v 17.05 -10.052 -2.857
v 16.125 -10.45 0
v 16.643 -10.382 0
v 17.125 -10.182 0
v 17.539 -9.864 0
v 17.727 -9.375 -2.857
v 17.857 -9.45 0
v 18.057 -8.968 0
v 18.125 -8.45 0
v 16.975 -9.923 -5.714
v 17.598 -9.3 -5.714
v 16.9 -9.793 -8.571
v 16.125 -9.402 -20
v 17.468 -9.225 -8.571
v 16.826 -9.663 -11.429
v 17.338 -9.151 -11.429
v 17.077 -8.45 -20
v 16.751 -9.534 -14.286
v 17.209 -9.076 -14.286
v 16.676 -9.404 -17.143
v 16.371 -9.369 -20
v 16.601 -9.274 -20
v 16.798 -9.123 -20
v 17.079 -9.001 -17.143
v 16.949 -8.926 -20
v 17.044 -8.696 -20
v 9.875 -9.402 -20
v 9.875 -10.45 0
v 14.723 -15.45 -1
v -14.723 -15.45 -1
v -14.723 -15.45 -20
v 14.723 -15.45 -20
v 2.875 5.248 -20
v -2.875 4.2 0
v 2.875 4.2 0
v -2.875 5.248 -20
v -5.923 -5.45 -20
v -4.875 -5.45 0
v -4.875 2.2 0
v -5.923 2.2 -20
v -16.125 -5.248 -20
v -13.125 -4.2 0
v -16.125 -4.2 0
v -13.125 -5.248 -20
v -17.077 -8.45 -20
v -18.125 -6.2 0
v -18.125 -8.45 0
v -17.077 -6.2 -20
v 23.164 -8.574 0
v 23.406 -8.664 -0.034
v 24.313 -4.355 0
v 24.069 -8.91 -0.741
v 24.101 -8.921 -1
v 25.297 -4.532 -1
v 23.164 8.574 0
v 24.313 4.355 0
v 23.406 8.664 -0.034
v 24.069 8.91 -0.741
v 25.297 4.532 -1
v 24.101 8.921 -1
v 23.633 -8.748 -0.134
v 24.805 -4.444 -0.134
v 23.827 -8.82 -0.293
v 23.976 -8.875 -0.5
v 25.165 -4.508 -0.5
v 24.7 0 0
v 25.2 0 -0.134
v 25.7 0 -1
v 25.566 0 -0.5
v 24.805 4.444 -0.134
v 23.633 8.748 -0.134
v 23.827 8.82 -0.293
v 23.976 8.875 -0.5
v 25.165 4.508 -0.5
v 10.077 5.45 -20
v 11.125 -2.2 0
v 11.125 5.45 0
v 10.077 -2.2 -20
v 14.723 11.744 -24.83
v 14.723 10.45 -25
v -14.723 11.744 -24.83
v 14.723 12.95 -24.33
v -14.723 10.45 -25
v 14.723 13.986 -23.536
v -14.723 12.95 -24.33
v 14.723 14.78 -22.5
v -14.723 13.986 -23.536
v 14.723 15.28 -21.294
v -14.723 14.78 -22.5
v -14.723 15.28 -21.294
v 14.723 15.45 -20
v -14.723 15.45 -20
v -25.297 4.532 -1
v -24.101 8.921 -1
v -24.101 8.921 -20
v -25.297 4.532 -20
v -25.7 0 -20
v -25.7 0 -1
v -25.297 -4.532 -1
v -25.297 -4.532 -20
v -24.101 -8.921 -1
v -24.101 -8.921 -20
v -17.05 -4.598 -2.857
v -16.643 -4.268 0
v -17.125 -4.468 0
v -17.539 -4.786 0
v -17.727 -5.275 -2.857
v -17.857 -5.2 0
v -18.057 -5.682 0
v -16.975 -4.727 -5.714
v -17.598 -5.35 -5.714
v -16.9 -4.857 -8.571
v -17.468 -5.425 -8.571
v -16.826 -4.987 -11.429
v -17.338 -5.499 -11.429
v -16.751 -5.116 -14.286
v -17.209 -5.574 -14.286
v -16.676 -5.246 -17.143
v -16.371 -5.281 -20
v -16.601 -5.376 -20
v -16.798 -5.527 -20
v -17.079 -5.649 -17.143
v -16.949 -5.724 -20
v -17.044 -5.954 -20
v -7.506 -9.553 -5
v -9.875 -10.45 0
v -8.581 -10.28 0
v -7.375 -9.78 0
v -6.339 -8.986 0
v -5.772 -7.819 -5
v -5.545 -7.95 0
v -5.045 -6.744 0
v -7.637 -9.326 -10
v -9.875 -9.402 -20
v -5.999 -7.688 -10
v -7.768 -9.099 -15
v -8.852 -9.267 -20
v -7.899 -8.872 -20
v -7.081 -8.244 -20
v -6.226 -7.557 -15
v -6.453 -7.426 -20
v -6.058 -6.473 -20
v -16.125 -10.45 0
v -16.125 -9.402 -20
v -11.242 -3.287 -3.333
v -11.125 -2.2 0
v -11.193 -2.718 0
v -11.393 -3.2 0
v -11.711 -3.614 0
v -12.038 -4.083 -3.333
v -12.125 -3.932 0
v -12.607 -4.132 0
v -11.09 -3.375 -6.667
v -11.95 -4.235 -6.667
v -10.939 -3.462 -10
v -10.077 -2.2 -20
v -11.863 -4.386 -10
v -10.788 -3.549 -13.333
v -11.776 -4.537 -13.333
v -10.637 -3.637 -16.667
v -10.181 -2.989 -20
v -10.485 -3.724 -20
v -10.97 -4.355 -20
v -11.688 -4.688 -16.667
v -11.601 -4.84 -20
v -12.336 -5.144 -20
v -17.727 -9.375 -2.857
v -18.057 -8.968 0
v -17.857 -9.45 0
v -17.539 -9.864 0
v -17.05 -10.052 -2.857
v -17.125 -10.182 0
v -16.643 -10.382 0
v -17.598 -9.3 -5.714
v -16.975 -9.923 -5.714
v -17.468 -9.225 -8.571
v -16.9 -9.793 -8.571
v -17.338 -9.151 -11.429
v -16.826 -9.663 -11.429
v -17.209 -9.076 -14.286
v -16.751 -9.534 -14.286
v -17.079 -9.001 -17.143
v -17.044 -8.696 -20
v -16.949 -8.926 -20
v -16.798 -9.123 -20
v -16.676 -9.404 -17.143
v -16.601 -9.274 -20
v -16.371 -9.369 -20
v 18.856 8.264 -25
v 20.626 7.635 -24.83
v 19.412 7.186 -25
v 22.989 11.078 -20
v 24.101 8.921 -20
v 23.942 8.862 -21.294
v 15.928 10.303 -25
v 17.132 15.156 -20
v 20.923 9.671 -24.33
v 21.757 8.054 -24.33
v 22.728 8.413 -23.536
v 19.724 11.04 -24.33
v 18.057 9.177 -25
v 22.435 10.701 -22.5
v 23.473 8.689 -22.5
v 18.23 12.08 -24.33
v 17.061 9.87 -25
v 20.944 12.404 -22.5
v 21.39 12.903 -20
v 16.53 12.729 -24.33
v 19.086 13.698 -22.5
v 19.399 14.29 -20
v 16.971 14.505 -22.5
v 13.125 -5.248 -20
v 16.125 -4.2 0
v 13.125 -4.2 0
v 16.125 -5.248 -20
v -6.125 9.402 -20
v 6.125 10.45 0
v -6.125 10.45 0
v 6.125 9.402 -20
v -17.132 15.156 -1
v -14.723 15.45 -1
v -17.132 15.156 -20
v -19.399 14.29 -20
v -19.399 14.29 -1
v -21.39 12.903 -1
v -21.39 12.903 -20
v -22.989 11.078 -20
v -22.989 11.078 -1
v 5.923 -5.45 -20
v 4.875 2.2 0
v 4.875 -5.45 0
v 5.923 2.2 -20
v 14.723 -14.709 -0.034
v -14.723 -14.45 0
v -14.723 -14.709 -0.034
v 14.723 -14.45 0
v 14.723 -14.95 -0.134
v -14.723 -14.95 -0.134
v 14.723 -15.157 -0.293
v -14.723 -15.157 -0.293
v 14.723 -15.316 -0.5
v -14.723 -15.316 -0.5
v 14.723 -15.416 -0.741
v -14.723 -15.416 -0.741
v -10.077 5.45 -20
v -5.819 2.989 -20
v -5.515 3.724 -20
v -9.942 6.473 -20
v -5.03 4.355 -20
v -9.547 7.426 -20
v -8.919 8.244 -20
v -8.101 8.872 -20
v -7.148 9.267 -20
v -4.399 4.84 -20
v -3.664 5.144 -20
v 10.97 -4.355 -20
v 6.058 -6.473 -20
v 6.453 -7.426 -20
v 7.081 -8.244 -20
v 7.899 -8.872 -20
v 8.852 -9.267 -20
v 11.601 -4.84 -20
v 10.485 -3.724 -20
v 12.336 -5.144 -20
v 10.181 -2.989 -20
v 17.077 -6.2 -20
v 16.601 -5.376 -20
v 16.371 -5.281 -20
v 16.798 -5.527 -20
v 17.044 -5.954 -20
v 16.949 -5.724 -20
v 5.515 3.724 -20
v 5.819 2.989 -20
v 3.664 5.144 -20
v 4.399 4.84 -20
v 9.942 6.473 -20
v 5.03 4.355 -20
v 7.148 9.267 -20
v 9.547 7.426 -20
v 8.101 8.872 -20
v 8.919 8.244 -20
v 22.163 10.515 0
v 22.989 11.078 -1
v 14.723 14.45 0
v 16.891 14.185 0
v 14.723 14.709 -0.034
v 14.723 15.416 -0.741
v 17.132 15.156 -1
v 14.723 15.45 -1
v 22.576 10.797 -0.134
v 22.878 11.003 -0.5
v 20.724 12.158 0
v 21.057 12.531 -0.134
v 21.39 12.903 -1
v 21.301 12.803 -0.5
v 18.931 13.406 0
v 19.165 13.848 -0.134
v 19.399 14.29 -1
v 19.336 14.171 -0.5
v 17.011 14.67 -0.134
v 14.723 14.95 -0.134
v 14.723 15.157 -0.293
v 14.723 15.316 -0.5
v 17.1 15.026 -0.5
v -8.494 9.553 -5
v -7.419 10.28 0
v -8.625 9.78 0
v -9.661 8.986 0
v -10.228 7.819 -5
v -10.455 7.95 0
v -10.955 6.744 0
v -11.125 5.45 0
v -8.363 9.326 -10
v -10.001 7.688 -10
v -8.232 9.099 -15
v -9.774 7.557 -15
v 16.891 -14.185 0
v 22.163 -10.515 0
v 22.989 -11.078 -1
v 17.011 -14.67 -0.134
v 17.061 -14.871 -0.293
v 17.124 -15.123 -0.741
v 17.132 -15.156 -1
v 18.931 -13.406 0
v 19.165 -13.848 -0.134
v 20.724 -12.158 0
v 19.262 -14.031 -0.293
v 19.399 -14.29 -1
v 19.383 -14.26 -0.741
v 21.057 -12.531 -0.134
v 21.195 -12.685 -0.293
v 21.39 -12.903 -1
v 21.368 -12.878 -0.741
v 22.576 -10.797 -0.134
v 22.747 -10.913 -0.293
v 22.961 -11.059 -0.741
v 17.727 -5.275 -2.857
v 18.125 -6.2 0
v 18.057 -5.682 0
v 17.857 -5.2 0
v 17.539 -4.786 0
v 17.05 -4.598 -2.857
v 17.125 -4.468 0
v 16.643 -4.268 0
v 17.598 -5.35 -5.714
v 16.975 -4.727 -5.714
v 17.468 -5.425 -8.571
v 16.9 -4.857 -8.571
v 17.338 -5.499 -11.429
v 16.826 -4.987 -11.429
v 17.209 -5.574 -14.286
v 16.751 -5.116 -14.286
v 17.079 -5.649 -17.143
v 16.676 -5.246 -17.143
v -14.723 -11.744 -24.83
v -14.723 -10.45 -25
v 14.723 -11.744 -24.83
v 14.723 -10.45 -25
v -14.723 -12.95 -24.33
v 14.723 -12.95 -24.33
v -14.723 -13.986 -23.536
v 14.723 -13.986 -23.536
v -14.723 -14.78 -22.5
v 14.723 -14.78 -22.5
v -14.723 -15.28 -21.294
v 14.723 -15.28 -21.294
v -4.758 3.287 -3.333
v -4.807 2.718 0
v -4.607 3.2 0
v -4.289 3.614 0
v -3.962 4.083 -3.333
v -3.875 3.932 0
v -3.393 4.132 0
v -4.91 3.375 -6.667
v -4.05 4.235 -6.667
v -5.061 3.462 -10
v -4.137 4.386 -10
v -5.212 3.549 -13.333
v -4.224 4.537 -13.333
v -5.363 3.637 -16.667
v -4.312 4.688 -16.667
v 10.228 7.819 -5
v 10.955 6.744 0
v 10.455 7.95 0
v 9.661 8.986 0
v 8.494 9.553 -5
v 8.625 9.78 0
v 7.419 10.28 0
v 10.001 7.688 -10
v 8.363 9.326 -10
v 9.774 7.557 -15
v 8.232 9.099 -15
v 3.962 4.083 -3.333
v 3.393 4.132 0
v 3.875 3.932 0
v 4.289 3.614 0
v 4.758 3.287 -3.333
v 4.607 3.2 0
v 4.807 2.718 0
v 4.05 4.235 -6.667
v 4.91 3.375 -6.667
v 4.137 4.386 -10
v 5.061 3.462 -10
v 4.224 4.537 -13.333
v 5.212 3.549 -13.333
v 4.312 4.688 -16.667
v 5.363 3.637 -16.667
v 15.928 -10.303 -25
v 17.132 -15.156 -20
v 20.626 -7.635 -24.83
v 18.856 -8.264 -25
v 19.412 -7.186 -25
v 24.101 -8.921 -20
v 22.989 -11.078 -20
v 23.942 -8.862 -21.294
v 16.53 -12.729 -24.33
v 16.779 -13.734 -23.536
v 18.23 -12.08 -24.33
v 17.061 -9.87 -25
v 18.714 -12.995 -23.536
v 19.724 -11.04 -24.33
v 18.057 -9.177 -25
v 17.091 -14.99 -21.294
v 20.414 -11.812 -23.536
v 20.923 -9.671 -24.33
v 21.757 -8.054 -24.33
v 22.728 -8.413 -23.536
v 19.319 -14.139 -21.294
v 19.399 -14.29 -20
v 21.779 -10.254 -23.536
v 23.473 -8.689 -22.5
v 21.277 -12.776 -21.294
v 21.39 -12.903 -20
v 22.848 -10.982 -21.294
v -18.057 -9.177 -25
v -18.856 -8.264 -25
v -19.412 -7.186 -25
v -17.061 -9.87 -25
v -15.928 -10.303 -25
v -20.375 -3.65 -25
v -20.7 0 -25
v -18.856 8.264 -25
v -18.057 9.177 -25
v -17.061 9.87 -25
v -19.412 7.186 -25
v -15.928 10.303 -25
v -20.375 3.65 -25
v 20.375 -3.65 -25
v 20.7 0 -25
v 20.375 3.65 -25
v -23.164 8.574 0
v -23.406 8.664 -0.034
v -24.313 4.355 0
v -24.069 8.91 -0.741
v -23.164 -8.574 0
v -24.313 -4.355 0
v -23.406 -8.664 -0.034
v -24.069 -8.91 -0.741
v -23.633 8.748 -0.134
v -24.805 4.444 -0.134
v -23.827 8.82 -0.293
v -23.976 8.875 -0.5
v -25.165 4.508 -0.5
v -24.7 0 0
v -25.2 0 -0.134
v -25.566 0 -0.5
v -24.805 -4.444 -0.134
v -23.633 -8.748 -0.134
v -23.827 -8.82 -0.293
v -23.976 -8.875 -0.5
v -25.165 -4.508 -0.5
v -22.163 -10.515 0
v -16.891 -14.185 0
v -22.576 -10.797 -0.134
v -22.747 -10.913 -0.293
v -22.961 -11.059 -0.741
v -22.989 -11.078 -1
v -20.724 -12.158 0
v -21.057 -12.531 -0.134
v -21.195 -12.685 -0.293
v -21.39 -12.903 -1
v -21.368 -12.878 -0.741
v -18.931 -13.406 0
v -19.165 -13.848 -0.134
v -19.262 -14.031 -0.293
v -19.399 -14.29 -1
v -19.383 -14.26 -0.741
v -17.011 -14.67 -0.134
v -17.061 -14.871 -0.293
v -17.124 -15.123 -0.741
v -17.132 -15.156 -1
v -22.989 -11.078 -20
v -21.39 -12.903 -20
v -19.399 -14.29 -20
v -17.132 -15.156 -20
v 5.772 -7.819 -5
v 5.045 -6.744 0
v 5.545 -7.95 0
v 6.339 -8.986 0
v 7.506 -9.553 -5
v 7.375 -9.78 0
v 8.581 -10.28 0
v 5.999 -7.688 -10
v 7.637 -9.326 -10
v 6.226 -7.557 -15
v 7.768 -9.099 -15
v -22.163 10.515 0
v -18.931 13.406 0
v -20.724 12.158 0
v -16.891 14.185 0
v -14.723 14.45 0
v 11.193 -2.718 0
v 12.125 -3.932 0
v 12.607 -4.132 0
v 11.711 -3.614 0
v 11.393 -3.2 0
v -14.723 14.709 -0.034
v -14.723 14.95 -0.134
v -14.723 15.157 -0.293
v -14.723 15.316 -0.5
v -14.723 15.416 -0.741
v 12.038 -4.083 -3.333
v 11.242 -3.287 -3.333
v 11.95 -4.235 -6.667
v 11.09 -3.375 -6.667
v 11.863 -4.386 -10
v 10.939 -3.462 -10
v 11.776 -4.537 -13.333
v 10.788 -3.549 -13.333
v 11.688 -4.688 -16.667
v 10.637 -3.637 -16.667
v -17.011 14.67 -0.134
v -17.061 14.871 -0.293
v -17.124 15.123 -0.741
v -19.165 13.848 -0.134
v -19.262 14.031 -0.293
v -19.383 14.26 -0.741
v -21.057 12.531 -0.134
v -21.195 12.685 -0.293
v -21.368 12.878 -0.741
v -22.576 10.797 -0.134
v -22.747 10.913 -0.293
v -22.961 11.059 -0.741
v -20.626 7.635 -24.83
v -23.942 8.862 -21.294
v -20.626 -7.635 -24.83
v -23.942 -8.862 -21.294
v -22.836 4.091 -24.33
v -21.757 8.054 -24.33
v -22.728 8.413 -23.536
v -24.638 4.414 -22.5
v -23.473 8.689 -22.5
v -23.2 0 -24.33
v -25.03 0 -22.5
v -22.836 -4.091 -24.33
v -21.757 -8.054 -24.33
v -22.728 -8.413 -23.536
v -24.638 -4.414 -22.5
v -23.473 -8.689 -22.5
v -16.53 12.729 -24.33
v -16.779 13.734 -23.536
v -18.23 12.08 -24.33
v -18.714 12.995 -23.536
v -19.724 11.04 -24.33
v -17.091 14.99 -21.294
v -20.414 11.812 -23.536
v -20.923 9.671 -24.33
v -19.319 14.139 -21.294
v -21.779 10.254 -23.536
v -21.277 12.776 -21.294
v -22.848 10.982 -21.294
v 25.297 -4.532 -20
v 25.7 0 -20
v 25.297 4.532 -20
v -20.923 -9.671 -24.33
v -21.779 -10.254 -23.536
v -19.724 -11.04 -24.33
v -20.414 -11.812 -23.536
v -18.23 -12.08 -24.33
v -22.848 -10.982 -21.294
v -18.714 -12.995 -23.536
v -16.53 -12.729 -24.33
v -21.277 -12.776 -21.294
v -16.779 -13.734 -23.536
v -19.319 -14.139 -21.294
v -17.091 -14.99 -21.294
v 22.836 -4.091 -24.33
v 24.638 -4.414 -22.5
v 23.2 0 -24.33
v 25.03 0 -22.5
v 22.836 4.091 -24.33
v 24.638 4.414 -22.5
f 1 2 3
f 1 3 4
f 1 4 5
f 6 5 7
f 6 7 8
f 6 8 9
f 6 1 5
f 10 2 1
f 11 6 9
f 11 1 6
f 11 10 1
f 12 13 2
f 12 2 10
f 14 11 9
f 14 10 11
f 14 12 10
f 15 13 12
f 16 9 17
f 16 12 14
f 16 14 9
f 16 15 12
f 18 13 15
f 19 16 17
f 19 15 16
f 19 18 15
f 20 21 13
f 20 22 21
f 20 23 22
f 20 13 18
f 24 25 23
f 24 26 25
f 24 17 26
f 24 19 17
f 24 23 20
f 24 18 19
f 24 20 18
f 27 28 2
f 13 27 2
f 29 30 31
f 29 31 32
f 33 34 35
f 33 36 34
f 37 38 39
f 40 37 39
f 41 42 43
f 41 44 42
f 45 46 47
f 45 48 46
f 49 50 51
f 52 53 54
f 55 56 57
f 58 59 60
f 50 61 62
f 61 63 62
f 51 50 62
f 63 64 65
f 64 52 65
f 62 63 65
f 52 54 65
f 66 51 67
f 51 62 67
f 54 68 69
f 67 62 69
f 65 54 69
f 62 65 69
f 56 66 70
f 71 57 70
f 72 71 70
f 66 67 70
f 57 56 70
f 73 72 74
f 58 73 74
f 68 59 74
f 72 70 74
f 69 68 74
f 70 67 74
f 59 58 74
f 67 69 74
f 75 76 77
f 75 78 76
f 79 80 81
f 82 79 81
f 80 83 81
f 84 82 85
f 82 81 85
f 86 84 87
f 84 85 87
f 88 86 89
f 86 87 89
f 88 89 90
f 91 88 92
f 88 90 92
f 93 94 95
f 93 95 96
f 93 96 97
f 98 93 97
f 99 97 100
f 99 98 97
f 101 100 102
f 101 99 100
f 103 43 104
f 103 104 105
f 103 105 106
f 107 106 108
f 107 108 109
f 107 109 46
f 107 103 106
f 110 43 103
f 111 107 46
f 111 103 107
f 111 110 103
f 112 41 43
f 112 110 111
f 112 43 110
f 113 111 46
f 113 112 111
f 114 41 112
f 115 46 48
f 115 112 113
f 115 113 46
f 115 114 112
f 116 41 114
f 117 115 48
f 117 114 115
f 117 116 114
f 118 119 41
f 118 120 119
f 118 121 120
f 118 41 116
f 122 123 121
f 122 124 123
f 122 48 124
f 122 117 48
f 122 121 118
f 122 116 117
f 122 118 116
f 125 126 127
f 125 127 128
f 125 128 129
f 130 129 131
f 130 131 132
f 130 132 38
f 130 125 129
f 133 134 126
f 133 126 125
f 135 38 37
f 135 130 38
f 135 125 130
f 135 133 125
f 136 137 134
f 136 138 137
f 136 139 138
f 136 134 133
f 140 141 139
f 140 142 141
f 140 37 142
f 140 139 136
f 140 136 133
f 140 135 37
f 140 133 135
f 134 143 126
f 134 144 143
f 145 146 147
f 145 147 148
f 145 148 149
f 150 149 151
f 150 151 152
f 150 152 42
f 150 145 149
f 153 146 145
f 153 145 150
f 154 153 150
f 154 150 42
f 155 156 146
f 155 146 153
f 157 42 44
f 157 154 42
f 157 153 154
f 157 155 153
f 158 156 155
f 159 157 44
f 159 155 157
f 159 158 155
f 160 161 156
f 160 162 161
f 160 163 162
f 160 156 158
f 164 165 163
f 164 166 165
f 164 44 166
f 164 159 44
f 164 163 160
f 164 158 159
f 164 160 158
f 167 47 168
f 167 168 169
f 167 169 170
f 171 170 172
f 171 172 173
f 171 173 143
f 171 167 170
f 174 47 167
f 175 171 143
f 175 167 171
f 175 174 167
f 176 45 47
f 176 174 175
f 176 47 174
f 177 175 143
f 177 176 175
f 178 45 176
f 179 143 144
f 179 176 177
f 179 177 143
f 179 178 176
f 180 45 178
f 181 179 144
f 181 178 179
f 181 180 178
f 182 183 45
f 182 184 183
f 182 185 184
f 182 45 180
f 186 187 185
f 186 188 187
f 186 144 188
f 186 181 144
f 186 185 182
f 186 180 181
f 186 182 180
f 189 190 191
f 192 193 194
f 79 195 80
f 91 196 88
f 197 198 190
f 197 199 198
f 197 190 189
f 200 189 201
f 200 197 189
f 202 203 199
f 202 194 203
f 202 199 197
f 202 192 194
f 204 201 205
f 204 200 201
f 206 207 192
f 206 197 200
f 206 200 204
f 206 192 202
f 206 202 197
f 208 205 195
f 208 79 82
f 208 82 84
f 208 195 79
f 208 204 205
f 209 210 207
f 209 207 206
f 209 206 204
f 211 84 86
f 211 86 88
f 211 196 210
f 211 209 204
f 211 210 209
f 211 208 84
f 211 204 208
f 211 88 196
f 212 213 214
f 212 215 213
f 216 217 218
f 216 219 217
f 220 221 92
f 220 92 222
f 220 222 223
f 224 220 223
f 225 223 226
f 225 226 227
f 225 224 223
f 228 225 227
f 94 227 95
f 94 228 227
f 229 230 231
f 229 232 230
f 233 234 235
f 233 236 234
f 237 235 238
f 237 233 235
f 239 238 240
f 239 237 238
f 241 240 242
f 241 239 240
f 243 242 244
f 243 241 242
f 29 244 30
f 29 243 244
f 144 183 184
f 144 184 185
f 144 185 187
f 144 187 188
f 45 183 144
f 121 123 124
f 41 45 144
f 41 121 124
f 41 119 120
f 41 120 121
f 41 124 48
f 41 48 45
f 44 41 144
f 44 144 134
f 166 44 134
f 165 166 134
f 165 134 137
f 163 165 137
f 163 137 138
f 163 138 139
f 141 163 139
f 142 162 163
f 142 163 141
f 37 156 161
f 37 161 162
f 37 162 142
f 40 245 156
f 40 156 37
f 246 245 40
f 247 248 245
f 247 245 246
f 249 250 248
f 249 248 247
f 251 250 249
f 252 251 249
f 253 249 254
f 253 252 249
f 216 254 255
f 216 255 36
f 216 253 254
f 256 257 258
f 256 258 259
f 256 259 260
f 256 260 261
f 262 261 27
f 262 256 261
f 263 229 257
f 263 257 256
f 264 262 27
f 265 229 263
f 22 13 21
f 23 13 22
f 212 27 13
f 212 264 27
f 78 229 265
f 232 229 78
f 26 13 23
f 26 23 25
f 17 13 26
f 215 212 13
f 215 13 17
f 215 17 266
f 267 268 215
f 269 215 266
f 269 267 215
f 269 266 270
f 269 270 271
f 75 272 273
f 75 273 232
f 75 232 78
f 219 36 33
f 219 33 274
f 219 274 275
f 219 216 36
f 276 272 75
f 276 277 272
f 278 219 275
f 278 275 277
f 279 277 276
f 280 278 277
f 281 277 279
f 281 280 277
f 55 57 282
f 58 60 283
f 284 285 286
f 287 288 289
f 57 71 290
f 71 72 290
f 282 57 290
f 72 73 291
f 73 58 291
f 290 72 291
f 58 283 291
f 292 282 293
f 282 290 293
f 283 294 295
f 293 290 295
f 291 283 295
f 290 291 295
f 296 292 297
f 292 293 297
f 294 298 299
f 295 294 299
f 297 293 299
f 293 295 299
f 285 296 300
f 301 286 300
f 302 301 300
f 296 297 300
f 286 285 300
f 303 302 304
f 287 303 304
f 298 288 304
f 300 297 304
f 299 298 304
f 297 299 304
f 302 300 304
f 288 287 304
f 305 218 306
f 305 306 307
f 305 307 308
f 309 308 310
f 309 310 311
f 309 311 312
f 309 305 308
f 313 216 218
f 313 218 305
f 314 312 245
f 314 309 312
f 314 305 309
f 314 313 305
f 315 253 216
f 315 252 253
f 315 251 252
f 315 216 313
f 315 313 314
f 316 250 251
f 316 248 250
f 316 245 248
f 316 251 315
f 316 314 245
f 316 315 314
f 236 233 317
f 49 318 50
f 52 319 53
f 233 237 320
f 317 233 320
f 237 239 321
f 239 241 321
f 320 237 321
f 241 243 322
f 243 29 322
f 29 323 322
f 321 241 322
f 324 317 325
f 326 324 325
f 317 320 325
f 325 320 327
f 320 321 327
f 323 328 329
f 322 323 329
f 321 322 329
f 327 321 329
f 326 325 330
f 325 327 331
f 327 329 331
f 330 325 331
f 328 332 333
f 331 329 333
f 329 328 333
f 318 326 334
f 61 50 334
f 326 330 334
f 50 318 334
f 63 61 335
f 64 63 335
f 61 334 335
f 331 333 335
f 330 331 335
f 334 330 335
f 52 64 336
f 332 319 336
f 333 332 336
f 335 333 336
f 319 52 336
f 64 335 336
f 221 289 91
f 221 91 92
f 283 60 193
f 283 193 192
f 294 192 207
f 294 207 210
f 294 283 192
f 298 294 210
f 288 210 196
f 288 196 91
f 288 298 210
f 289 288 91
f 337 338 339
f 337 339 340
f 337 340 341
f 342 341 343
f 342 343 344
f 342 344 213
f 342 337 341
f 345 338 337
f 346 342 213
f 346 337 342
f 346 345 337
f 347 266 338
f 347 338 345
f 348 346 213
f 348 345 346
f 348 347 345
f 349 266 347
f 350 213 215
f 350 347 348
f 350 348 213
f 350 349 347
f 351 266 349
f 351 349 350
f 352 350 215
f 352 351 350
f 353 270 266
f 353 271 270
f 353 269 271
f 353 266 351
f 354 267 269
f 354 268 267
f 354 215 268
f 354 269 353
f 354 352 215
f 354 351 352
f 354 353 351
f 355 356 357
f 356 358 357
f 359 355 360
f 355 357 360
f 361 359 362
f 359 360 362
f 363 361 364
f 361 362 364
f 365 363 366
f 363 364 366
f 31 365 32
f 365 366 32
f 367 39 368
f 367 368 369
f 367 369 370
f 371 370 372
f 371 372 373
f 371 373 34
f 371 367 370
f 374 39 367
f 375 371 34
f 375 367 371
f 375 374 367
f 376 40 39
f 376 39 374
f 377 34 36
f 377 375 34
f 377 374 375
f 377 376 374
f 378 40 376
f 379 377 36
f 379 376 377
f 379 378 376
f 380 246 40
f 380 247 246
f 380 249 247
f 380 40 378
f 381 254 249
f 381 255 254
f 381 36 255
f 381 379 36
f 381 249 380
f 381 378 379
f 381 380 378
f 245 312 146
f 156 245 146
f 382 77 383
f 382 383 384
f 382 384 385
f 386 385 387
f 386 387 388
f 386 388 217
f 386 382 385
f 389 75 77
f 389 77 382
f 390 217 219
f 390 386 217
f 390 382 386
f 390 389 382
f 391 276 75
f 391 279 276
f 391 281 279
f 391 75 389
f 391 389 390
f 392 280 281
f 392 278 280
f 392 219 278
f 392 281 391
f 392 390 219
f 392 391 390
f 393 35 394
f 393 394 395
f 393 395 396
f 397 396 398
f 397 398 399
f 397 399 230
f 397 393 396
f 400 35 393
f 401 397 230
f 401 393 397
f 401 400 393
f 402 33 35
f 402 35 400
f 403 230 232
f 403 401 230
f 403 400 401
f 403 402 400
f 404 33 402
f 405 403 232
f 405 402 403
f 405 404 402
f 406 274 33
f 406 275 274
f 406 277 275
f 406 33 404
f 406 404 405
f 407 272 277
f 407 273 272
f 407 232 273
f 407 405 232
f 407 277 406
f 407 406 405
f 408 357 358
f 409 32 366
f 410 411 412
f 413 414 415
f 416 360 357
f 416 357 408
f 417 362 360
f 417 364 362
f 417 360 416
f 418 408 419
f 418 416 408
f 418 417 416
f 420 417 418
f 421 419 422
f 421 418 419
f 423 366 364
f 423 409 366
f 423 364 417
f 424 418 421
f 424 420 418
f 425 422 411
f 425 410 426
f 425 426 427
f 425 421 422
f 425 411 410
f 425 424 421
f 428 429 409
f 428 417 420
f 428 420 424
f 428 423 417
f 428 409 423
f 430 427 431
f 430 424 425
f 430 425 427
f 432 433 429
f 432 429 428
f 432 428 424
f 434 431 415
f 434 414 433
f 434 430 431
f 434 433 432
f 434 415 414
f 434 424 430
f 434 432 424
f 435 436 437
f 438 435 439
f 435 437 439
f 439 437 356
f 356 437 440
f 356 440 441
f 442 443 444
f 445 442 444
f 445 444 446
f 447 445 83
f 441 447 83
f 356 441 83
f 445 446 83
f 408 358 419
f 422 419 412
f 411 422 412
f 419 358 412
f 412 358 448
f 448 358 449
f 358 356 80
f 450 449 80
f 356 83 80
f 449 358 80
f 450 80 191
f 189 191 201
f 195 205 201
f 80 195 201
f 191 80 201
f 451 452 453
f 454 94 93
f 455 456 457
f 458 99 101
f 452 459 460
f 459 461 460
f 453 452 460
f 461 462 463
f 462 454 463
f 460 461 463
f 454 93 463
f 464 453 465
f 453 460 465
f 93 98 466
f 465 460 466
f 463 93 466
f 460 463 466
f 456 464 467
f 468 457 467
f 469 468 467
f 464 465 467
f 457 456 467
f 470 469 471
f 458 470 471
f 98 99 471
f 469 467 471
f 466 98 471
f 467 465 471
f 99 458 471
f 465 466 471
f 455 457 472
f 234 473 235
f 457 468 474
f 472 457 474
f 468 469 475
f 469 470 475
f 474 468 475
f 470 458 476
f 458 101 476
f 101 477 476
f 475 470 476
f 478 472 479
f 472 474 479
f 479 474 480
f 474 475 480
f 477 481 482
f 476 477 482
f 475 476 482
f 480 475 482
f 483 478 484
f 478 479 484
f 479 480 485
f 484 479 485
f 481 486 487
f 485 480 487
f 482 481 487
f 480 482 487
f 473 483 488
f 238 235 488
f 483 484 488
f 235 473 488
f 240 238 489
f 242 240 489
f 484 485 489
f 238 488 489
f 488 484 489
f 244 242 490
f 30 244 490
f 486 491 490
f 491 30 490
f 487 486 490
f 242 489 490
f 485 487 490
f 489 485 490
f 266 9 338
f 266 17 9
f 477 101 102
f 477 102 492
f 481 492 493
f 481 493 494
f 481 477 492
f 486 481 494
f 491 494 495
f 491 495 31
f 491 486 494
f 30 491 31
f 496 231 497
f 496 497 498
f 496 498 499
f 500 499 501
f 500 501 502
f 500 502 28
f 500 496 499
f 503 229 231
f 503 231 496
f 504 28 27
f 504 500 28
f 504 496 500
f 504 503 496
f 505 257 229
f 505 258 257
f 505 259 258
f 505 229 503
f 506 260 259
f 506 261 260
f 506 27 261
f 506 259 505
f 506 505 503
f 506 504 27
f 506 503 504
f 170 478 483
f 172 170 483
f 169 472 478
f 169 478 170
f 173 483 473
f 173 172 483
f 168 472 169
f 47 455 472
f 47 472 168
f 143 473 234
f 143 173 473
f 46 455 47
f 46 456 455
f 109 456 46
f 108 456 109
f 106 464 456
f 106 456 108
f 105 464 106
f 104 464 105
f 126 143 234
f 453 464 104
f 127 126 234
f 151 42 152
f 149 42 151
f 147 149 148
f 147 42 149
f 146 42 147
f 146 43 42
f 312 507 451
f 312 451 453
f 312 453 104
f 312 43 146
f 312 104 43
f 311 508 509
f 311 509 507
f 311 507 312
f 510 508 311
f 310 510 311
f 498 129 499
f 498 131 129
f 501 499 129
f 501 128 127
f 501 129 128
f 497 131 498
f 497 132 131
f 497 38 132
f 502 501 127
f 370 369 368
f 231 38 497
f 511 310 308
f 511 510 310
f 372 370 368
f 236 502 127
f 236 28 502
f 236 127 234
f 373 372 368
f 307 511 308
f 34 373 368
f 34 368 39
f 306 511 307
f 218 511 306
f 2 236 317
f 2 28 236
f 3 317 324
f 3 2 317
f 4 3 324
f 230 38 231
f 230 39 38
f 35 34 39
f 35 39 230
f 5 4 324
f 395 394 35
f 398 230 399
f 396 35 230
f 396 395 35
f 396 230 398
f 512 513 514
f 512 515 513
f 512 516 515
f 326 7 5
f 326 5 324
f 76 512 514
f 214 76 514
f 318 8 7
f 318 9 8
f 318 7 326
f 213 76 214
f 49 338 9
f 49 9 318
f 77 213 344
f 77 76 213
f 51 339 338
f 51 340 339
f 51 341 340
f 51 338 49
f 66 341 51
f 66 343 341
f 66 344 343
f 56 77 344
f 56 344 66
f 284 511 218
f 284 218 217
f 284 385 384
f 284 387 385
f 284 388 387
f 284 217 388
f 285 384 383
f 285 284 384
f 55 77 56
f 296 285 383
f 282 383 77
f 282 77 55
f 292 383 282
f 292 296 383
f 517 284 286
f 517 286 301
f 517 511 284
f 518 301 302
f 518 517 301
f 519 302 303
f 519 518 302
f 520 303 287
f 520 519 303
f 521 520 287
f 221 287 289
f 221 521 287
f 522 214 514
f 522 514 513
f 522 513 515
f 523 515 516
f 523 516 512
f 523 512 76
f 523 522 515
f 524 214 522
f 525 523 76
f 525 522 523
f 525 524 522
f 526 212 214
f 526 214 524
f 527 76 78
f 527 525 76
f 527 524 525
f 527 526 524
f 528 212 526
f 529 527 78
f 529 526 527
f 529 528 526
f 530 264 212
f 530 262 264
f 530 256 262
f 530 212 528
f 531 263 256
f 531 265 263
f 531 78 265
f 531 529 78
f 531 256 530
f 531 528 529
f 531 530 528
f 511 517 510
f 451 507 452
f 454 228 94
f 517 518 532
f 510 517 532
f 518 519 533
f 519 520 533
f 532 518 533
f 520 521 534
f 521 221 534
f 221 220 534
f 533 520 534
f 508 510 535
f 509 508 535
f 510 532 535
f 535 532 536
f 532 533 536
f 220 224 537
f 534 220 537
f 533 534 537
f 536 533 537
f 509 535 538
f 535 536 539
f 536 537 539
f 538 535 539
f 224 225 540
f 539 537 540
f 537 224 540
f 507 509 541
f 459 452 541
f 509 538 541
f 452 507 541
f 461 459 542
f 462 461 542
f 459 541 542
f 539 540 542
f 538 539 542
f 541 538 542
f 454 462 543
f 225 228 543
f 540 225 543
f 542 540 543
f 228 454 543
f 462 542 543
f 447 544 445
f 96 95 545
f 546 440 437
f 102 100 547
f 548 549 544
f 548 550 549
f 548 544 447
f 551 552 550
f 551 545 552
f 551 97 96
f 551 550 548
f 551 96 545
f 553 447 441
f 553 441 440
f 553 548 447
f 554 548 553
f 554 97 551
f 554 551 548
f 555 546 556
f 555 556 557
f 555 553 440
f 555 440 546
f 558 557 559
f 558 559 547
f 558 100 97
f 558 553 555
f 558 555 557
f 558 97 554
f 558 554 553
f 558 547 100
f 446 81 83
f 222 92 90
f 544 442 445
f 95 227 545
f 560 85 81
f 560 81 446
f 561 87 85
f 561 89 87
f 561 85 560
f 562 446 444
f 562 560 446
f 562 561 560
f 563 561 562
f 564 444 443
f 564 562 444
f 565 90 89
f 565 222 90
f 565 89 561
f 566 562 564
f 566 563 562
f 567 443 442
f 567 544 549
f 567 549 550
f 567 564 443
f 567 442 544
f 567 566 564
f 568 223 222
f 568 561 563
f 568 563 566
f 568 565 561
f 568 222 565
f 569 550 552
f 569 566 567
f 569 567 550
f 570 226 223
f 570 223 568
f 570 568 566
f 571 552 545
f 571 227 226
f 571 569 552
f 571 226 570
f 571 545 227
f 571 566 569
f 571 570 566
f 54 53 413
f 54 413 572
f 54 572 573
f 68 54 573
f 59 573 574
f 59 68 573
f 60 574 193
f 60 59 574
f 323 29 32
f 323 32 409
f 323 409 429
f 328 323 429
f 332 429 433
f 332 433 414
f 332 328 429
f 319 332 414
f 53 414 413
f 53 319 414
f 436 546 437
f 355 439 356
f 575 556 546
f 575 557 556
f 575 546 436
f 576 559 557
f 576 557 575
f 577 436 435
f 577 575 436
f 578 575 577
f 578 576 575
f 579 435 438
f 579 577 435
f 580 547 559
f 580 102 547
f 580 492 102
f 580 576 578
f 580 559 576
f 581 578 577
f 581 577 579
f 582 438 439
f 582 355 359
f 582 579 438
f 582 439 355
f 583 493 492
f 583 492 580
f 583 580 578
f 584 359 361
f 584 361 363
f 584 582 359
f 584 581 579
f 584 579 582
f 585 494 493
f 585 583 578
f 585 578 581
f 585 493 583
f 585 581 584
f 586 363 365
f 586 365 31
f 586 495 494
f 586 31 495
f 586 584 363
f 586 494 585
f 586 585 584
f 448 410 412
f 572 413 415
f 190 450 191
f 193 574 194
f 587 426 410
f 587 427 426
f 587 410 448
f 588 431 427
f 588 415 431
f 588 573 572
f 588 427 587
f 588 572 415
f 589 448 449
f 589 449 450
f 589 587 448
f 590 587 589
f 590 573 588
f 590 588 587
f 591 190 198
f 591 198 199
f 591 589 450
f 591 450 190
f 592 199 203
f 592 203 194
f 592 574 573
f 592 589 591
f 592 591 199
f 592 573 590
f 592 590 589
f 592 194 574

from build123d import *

# Parameters (mm, degrees)
F1_DEPTH = 25
F2_DEPTH = 20
F2_TAPER = 3
F3_R     = 1
F4_R     = 5


with BuildPart() as f1:
    # F0 (on Top) → F1 (new body)
    with BuildSketch(Plane.XY):
        with BuildLine():
            ThreePointArc((-14.723294392, 15.45), (-20.4366897043, 13.6571379912), (-24.1014191371, 8.9214228012))
            ThreePointArc((-24.1014191371, 8.9214228012), (-25.6996145734, 0), (-24.1014191371, -8.9214228012))
            ThreePointArc((-24.1014191371, -8.9214228012), (-20.4366897043, -13.6571379912), (-14.723294392, -15.45))
            Line((-14.723294392, -15.45), (14.723294392, -15.45))
            ThreePointArc((14.723294392, -15.45), (20.4366897043, -13.6571379912), (24.1014191371, -8.9214228012))
            ThreePointArc((24.1014191371, -8.9214228012), (25.6996145734, 0), (24.1014191371, 8.9214228012))
            ThreePointArc((24.1014191371, 8.9214228012), (20.4366897043, 13.6571379912), (14.723294392, 15.45))
            Line((14.723294392, 15.45), (-14.723294392, 15.45))
        make_face()
        with BuildLine():
            Line((-6.125, 10.45), (6.125, 10.45))
            ThreePointArc((6.125, 10.45), (9.6605339059, 8.9855339059), (11.125, 5.45))
            Line((11.125, 5.45), (11.125, -2.2))
            ThreePointArc((11.125, -2.2), (11.7107864376, -3.6142135624), (13.125, -4.2))
            Line((13.125, -4.2), (16.125, -4.2))
            ThreePointArc((16.125, -4.2), (17.5392135624, -4.7857864376), (18.125, -6.2))
            Line((18.125, -6.2), (18.125, -8.45))
            ThreePointArc((18.125, -8.45), (17.5392135624, -9.8642135624), (16.125, -10.45))
            Line((16.125, -10.45), (9.875, -10.45))
            ThreePointArc((9.875, -10.45), (6.3394660941, -8.9855339059), (4.875, -5.45))
            Line((4.875, -5.45), (4.875, 2.2))
            ThreePointArc((4.875, 2.2), (4.2892135624, 3.6142135624), (2.875, 4.2))
            Line((2.875, 4.2), (-2.875, 4.2))
            ThreePointArc((-2.875, 4.2), (-4.2892135624, 3.6142135624), (-4.875, 2.2))
            Line((-4.875, 2.2), (-4.875, -5.45))
            ThreePointArc((-4.875, -5.45), (-6.3394660941, -8.9855339059), (-9.875, -10.45))
            Line((-9.875, -10.45), (-16.125, -10.45))
            ThreePointArc((-16.125, -10.45), (-17.5392135624, -9.8642135624), (-18.125, -8.45))
            Line((-18.125, -8.45), (-18.125, -6.2))
            ThreePointArc((-18.125, -6.2), (-17.5392135624, -4.7857864376), (-16.125, -4.2))
            Line((-16.125, -4.2), (-13.125, -4.2))
            ThreePointArc((-13.125, -4.2), (-11.7107864376, -3.6142135624), (-11.125, -2.2))
            Line((-11.125, -2.2), (-11.125, 5.45))
            ThreePointArc((-11.125, 5.45), (-9.6605339059, 8.9855339059), (-6.125, 10.45))
        make_face(mode=Mode.SUBTRACT)
        with BuildLine():
            ThreePointArc((11.125, 5.45), (9.6605339059, 8.9855339059), (6.125, 10.45))
            Line((6.125, 10.45), (-6.125, 10.45))
            ThreePointArc((-6.125, 10.45), (-9.6605339059, 8.9855339059), (-11.125, 5.45))
            Line((-11.125, 5.45), (-11.125, -2.2))
            ThreePointArc((-11.125, -2.2), (-11.7107864376, -3.6142135624), (-13.125, -4.2))
            Line((-13.125, -4.2), (-16.125, -4.2))
            ThreePointArc((-16.125, -4.2), (-17.5392135624, -4.7857864376), (-18.125, -6.2))
            Line((-18.125, -6.2), (-18.125, -8.45))
            ThreePointArc((-18.125, -8.45), (-17.5392135624, -9.8642135624), (-16.125, -10.45))
            Line((-16.125, -10.45), (-9.875, -10.45))
            ThreePointArc((-9.875, -10.45), (-6.3394660941, -8.9855339059), (-4.875, -5.45))
            Line((-4.875, -5.45), (-4.875, 2.2))
            ThreePointArc((-4.875, 2.2), (-4.2892135624, 3.6142135624), (-2.875, 4.2))
            Line((-2.875, 4.2), (2.875, 4.2))
            ThreePointArc((2.875, 4.2), (4.2892135624, 3.6142135624), (4.875, 2.2))
            Line((4.875, 2.2), (4.875, -5.45))
            ThreePointArc((4.875, -5.45), (6.3394660941, -8.9855339059), (9.875, -10.45))
            Line((9.875, -10.45), (16.125, -10.45))
            ThreePointArc((16.125, -10.45), (17.5392135624, -9.8642135624), (18.125, -8.45))
            Line((18.125, -8.45), (18.125, -6.2))
            ThreePointArc((18.125, -6.2), (17.5392135624, -4.7857864376), (16.125, -4.2))
            Line((16.125, -4.2), (13.125, -4.2))
            ThreePointArc((13.125, -4.2), (11.7107864376, -3.6142135624), (11.125, -2.2))
            Line((11.125, -2.2), (11.125, 5.45))
        make_face()
    extrude(amount=-F1_DEPTH)

    # F0 (on Top) → F2 (cut)
    with BuildSketch(Plane.XY):
        with BuildLine():
            ThreePointArc((11.125, 5.45), (9.6605339059, 8.9855339059), (6.125, 10.45))
            Line((6.125, 10.45), (-6.125, 10.45))
            ThreePointArc((-6.125, 10.45), (-9.6605339059, 8.9855339059), (-11.125, 5.45))
            Line((-11.125, 5.45), (-11.125, -2.2))
            ThreePointArc((-11.125, -2.2), (-11.7107864376, -3.6142135624), (-13.125, -4.2))
            Line((-13.125, -4.2), (-16.125, -4.2))
            ThreePointArc((-16.125, -4.2), (-17.5392135624, -4.7857864376), (-18.125, -6.2))
            Line((-18.125, -6.2), (-18.125, -8.45))
            ThreePointArc((-18.125, -8.45), (-17.5392135624, -9.8642135624), (-16.125, -10.45))
            Line((-16.125, -10.45), (-9.875, -10.45))
            ThreePointArc((-9.875, -10.45), (-6.3394660941, -8.9855339059), (-4.875, -5.45))
            Line((-4.875, -5.45), (-4.875, 2.2))
            ThreePointArc((-4.875, 2.2), (-4.2892135624, 3.6142135624), (-2.875, 4.2))
            Line((-2.875, 4.2), (2.875, 4.2))
            ThreePointArc((2.875, 4.2), (4.2892135624, 3.6142135624), (4.875, 2.2))
            Line((4.875, 2.2), (4.875, -5.45))
            ThreePointArc((4.875, -5.45), (6.3394660941, -8.9855339059), (9.875, -10.45))
            Line((9.875, -10.45), (16.125, -10.45))
            ThreePointArc((16.125, -10.45), (17.5392135624, -9.8642135624), (18.125, -8.45))
            Line((18.125, -8.45), (18.125, -6.2))
            ThreePointArc((18.125, -6.2), (17.5392135624, -4.7857864376), (16.125, -4.2))
            Line((16.125, -4.2), (13.125, -4.2))
            ThreePointArc((13.125, -4.2), (11.7107864376, -3.6142135624), (11.125, -2.2))
            Line((11.125, -2.2), (11.125, 5.45))
        make_face()
    extrude(amount=-F2_DEPTH, taper=F2_TAPER, mode=Mode.SUBTRACT)

    # F3
    f3_edges = [f1.edges().sort_by_distance(p)[0] for p in [
        (0, -15.45, 0),
    ]]
    fillet(f3_edges, radius=F3_R)

    # F4
    f4_edges = [f1.edges().sort_by_distance(p)[0] for p in [
        (0, -15.45, -25),
    ]]
    fillet(f4_edges, radius=F4_R)


solid = f1.part
